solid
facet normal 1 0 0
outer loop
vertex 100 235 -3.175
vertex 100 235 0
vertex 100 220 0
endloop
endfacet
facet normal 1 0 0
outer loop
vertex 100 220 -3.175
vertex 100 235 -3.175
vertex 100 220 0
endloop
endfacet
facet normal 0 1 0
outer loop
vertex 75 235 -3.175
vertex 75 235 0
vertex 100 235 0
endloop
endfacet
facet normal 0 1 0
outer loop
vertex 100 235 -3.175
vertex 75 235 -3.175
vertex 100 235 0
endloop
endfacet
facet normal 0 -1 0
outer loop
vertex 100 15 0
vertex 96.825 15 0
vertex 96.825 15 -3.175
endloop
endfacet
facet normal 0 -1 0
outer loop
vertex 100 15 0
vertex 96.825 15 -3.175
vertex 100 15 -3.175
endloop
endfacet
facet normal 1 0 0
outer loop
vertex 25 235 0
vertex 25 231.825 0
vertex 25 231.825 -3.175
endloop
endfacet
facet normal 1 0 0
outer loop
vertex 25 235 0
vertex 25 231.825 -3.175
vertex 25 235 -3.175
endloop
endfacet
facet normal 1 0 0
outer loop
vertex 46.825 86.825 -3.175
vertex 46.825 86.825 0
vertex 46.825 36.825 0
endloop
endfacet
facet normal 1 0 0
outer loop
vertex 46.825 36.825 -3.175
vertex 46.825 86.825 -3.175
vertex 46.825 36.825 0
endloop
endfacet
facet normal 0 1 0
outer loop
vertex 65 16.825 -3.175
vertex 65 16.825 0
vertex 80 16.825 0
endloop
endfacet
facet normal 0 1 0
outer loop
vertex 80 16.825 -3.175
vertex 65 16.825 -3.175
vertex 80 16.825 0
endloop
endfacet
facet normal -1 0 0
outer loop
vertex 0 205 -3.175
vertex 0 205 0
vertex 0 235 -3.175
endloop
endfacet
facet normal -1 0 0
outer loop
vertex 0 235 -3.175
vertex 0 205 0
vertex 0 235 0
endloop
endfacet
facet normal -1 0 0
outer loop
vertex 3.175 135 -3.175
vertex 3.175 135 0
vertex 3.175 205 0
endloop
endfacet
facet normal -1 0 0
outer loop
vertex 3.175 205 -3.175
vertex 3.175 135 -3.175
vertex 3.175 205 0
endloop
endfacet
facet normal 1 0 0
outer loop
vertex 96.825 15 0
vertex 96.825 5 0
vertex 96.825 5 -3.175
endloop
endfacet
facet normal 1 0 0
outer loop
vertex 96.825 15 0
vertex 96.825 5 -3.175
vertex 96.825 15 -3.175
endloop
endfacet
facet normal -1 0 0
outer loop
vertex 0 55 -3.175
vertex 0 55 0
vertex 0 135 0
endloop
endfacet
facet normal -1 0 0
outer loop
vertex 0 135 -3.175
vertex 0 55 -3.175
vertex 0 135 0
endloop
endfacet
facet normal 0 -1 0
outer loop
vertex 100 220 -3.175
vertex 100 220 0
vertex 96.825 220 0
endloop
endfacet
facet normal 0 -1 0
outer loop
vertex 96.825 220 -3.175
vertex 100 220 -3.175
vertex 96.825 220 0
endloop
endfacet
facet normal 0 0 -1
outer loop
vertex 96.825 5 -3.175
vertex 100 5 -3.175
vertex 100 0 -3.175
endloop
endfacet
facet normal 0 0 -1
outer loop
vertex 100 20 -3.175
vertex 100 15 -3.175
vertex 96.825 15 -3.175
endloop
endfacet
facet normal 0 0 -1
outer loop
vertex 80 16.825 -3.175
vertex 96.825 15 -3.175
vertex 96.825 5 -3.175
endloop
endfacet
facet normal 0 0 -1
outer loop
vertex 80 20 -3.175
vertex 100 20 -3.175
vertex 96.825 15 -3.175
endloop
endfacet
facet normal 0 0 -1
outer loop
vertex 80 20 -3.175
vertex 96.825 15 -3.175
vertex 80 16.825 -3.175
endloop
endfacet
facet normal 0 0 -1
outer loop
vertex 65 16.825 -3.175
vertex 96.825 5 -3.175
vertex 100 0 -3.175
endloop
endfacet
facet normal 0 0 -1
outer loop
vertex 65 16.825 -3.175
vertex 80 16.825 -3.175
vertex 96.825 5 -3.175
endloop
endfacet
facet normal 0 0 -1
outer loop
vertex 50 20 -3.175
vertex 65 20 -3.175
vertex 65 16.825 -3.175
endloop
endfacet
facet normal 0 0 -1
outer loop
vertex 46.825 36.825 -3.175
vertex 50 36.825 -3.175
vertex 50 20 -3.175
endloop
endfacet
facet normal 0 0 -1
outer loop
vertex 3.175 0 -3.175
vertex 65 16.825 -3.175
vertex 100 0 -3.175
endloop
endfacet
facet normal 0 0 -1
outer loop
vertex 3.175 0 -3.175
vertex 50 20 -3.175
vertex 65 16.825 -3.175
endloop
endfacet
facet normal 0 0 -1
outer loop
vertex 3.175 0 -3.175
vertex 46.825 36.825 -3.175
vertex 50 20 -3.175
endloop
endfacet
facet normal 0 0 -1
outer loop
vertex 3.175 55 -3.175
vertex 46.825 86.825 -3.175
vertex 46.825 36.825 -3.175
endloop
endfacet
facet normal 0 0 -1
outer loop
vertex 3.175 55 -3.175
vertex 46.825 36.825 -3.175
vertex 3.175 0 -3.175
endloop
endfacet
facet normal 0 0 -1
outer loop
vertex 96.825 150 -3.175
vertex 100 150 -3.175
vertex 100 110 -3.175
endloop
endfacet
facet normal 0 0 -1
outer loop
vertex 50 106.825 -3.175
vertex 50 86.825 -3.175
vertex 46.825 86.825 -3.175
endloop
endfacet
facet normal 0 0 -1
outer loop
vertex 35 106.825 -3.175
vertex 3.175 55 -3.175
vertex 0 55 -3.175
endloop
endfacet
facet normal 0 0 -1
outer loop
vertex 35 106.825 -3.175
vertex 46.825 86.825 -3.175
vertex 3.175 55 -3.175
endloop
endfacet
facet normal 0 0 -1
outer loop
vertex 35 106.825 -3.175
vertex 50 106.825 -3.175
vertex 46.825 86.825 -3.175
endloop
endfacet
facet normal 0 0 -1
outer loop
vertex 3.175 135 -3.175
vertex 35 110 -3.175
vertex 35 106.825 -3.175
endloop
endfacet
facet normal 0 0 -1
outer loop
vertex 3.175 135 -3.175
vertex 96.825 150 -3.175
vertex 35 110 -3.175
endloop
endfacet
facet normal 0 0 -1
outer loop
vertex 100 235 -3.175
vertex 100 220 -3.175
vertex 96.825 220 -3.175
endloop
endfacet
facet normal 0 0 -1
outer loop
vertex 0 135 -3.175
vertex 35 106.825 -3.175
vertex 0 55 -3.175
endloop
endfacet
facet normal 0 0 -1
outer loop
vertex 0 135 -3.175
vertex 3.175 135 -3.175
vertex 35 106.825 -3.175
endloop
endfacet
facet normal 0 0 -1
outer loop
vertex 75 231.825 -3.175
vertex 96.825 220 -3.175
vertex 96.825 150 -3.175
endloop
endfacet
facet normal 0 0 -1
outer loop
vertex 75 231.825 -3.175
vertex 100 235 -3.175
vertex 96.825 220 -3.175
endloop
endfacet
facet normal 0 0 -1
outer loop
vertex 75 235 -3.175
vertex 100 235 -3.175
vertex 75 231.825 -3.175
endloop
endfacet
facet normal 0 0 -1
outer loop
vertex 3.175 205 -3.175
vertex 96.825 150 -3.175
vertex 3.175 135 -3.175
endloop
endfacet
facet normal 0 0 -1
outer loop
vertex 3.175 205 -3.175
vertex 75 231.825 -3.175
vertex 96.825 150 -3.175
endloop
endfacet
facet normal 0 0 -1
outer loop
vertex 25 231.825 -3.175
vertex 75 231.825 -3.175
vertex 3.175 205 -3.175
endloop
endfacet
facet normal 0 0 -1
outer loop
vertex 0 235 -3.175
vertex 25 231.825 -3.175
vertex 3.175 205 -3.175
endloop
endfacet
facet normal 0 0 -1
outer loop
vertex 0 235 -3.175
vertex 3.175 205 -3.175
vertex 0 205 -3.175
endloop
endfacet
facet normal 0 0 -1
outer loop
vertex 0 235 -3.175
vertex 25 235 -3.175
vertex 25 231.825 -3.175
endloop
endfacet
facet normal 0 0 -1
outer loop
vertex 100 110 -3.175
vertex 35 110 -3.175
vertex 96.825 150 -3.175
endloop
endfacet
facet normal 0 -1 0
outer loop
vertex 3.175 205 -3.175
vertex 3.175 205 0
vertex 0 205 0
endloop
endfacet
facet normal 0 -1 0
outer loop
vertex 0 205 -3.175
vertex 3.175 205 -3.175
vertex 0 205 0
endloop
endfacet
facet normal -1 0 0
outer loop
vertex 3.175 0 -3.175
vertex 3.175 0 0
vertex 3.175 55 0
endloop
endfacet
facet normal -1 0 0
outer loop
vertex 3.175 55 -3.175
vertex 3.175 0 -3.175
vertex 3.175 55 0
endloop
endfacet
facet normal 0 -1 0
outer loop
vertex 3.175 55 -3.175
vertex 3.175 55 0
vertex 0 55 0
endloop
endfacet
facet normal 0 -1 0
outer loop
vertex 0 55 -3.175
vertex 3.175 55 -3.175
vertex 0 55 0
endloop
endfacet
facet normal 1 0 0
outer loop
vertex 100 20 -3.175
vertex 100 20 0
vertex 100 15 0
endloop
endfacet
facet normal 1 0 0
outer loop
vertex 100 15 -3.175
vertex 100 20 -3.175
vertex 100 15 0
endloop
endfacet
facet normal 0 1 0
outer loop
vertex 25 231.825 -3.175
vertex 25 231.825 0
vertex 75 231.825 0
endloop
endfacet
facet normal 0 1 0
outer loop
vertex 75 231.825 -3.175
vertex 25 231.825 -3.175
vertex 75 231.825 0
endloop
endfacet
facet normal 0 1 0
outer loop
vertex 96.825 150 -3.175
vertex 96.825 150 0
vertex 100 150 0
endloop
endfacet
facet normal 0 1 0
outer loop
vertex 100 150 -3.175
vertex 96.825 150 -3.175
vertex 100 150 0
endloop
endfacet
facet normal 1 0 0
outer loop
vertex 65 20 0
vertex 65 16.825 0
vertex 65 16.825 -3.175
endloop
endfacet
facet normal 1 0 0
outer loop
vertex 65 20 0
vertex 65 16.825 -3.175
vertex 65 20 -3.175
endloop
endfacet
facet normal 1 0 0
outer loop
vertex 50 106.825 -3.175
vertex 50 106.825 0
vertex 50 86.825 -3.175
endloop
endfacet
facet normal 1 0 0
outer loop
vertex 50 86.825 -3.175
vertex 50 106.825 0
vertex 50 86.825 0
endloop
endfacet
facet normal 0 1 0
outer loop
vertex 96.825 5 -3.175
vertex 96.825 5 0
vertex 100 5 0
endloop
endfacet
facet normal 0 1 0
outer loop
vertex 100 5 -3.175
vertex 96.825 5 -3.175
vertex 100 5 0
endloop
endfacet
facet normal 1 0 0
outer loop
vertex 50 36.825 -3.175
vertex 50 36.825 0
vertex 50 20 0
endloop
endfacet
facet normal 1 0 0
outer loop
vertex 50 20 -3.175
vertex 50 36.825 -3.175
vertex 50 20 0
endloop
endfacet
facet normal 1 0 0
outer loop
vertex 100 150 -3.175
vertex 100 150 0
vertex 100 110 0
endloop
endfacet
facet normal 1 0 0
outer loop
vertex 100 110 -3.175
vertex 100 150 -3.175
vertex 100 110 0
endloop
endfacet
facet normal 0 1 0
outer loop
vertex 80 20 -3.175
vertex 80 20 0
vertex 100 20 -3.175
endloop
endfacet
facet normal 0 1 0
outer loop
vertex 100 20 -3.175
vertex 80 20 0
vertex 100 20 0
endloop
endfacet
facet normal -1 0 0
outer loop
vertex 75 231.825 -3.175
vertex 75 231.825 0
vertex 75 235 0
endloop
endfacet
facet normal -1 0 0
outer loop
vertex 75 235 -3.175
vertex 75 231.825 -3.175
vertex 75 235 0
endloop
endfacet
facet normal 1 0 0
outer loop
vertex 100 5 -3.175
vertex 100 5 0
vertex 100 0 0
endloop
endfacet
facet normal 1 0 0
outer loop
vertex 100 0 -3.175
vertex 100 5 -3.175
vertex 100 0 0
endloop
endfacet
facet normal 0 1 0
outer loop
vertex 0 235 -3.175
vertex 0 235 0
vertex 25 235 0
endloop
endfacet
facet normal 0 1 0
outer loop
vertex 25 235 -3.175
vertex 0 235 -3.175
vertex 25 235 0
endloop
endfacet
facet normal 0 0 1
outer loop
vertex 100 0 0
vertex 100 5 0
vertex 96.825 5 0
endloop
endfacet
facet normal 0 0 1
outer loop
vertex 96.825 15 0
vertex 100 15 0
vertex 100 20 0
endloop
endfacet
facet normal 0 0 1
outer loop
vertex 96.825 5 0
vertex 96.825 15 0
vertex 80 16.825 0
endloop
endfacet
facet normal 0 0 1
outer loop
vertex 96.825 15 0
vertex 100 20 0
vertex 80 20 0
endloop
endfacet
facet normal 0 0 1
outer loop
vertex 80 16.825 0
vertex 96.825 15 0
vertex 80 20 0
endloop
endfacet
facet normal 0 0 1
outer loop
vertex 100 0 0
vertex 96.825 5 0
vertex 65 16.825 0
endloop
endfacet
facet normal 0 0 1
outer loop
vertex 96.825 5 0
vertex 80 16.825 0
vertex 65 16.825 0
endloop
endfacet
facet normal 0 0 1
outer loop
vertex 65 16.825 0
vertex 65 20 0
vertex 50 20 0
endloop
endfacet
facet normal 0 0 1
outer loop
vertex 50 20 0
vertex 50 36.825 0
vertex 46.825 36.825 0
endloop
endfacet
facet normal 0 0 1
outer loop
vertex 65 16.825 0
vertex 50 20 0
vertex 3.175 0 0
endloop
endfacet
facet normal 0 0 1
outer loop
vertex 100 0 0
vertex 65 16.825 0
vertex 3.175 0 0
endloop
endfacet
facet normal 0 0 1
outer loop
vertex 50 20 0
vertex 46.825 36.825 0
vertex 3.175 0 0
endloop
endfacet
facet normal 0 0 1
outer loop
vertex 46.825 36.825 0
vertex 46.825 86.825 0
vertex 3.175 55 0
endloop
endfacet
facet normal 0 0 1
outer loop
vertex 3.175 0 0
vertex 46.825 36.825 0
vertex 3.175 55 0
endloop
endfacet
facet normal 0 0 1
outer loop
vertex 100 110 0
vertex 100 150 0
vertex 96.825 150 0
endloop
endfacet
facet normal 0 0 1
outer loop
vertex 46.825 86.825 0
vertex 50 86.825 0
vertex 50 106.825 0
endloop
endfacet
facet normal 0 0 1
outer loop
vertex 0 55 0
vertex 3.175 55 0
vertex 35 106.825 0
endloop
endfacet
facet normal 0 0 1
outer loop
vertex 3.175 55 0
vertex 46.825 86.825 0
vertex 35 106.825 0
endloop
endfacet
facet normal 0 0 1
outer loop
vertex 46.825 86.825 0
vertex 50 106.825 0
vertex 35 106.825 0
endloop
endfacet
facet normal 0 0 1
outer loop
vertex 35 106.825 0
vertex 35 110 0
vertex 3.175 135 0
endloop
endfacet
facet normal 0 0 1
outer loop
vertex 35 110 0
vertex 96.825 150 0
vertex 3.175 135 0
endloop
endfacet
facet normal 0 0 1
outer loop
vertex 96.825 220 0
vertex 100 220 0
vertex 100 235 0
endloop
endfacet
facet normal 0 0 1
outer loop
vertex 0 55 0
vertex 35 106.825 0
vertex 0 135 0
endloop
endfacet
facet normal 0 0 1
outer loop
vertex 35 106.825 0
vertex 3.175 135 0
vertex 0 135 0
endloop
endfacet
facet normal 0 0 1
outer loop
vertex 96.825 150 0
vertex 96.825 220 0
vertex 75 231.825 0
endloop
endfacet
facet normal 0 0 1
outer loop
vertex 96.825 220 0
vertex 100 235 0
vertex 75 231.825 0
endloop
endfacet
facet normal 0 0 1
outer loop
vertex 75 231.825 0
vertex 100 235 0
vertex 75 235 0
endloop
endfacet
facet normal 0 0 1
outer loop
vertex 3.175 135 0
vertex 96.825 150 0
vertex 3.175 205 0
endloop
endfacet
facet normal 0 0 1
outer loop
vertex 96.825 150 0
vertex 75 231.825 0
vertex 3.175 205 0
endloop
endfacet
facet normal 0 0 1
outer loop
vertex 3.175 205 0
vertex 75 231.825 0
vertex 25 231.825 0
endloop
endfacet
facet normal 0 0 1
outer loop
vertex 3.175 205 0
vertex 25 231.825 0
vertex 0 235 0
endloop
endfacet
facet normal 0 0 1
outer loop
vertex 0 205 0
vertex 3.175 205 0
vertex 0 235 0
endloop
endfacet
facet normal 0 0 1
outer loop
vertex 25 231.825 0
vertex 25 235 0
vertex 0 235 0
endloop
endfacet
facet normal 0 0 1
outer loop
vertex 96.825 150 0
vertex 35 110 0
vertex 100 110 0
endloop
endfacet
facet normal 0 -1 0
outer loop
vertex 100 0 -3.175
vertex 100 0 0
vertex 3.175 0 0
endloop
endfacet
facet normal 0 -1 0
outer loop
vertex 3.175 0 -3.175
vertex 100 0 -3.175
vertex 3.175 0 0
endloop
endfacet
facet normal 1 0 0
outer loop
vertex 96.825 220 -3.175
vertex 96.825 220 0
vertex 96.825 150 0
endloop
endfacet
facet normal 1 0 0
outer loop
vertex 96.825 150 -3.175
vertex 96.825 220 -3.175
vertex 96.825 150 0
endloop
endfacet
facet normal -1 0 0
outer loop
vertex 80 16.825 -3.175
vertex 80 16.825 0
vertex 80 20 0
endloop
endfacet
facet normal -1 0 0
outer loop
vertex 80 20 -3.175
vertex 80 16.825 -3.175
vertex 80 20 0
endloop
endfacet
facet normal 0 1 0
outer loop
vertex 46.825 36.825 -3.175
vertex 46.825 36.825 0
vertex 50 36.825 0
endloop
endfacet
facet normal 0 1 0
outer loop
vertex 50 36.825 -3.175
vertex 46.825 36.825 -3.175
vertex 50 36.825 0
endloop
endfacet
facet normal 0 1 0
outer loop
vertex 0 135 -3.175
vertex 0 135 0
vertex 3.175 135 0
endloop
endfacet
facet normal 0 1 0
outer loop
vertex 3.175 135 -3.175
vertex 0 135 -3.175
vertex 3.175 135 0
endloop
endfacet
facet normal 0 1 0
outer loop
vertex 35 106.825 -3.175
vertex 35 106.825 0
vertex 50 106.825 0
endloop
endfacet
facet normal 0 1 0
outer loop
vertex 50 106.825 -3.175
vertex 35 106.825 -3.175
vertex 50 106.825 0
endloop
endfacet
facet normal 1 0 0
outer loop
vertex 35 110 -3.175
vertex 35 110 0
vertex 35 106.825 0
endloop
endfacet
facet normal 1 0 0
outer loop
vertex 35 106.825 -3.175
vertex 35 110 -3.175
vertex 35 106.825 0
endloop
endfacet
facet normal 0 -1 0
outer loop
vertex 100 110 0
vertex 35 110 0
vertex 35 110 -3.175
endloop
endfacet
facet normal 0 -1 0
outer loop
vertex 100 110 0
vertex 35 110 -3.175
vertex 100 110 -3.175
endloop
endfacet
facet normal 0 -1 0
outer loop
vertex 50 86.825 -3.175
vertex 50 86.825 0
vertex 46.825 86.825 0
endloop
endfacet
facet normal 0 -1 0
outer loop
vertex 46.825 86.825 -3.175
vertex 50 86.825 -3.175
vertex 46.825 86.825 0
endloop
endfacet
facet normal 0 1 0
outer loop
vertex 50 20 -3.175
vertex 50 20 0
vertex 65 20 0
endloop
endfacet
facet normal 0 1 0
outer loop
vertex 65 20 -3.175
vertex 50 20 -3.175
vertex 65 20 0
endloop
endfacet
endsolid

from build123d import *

# Parameters (mm, degrees)
BOSS_EXTRUDE1_DEPTH = 3.175
SKETCH2_W           = 15
SKETCH2_H           = 3.175
CUT_EXTRUDE1_DEPTH  = 10
SKETCH3_W           = 50
SKETCH3_H           = 3.175
CUT_EXTRUDE2_DEPTH  = 10
SKETCH4_W           = 3.175
SKETCH4_H           = 10
CUT_EXTRUDE3_DEPTH  = 10


with BuildPart() as part:
    # Sketch1 → Boss-Extrude1 (new body)
    with BuildSketch(Plane.XY):
        Polygon((3.175, 0), (3.175, 55), (0, 55), (0, 135), (3.175, 135), (3.175, 205), (0, 205), (0, 235), (100, 235), (100, 220), (96.825, 220), (96.825, 150), (100, 150), (100, 110), (50, 110), (35, 110), (35, 106.825), (50, 106.825), (50, 86.825), (46.825, 86.825), (46.825, 36.825), (50, 36.825), (50, 20), (100, 20), (100, 0), align=None)
    extrude(amount=-BOSS_EXTRUDE1_DEPTH)

    # Sketch2 → Cut-Extrude1 (cut)
    with BuildSketch(Plane.XY):
        with Locations((72.5, 18.4125)):
            Rectangle(SKETCH2_W, SKETCH2_H)
    extrude(amount=-CUT_EXTRUDE1_DEPTH, mode=Mode.SUBTRACT)

    # Sketch3 → Cut-Extrude2 (cut)
    with BuildSketch(Plane.XY):
        with Locations((50, 233.4125)):
            Rectangle(SKETCH3_W, SKETCH3_H)
    extrude(amount=-CUT_EXTRUDE2_DEPTH, mode=Mode.SUBTRACT)

    # Sketch4 → Cut-Extrude3 (cut)
    with BuildSketch(Plane.XY):
        with Locations((98.4125, 10)):
            Rectangle(SKETCH4_W, SKETCH4_H)
    extrude(amount=-CUT_EXTRUDE3_DEPTH, mode=Mode.SUBTRACT)


solid = part.part
